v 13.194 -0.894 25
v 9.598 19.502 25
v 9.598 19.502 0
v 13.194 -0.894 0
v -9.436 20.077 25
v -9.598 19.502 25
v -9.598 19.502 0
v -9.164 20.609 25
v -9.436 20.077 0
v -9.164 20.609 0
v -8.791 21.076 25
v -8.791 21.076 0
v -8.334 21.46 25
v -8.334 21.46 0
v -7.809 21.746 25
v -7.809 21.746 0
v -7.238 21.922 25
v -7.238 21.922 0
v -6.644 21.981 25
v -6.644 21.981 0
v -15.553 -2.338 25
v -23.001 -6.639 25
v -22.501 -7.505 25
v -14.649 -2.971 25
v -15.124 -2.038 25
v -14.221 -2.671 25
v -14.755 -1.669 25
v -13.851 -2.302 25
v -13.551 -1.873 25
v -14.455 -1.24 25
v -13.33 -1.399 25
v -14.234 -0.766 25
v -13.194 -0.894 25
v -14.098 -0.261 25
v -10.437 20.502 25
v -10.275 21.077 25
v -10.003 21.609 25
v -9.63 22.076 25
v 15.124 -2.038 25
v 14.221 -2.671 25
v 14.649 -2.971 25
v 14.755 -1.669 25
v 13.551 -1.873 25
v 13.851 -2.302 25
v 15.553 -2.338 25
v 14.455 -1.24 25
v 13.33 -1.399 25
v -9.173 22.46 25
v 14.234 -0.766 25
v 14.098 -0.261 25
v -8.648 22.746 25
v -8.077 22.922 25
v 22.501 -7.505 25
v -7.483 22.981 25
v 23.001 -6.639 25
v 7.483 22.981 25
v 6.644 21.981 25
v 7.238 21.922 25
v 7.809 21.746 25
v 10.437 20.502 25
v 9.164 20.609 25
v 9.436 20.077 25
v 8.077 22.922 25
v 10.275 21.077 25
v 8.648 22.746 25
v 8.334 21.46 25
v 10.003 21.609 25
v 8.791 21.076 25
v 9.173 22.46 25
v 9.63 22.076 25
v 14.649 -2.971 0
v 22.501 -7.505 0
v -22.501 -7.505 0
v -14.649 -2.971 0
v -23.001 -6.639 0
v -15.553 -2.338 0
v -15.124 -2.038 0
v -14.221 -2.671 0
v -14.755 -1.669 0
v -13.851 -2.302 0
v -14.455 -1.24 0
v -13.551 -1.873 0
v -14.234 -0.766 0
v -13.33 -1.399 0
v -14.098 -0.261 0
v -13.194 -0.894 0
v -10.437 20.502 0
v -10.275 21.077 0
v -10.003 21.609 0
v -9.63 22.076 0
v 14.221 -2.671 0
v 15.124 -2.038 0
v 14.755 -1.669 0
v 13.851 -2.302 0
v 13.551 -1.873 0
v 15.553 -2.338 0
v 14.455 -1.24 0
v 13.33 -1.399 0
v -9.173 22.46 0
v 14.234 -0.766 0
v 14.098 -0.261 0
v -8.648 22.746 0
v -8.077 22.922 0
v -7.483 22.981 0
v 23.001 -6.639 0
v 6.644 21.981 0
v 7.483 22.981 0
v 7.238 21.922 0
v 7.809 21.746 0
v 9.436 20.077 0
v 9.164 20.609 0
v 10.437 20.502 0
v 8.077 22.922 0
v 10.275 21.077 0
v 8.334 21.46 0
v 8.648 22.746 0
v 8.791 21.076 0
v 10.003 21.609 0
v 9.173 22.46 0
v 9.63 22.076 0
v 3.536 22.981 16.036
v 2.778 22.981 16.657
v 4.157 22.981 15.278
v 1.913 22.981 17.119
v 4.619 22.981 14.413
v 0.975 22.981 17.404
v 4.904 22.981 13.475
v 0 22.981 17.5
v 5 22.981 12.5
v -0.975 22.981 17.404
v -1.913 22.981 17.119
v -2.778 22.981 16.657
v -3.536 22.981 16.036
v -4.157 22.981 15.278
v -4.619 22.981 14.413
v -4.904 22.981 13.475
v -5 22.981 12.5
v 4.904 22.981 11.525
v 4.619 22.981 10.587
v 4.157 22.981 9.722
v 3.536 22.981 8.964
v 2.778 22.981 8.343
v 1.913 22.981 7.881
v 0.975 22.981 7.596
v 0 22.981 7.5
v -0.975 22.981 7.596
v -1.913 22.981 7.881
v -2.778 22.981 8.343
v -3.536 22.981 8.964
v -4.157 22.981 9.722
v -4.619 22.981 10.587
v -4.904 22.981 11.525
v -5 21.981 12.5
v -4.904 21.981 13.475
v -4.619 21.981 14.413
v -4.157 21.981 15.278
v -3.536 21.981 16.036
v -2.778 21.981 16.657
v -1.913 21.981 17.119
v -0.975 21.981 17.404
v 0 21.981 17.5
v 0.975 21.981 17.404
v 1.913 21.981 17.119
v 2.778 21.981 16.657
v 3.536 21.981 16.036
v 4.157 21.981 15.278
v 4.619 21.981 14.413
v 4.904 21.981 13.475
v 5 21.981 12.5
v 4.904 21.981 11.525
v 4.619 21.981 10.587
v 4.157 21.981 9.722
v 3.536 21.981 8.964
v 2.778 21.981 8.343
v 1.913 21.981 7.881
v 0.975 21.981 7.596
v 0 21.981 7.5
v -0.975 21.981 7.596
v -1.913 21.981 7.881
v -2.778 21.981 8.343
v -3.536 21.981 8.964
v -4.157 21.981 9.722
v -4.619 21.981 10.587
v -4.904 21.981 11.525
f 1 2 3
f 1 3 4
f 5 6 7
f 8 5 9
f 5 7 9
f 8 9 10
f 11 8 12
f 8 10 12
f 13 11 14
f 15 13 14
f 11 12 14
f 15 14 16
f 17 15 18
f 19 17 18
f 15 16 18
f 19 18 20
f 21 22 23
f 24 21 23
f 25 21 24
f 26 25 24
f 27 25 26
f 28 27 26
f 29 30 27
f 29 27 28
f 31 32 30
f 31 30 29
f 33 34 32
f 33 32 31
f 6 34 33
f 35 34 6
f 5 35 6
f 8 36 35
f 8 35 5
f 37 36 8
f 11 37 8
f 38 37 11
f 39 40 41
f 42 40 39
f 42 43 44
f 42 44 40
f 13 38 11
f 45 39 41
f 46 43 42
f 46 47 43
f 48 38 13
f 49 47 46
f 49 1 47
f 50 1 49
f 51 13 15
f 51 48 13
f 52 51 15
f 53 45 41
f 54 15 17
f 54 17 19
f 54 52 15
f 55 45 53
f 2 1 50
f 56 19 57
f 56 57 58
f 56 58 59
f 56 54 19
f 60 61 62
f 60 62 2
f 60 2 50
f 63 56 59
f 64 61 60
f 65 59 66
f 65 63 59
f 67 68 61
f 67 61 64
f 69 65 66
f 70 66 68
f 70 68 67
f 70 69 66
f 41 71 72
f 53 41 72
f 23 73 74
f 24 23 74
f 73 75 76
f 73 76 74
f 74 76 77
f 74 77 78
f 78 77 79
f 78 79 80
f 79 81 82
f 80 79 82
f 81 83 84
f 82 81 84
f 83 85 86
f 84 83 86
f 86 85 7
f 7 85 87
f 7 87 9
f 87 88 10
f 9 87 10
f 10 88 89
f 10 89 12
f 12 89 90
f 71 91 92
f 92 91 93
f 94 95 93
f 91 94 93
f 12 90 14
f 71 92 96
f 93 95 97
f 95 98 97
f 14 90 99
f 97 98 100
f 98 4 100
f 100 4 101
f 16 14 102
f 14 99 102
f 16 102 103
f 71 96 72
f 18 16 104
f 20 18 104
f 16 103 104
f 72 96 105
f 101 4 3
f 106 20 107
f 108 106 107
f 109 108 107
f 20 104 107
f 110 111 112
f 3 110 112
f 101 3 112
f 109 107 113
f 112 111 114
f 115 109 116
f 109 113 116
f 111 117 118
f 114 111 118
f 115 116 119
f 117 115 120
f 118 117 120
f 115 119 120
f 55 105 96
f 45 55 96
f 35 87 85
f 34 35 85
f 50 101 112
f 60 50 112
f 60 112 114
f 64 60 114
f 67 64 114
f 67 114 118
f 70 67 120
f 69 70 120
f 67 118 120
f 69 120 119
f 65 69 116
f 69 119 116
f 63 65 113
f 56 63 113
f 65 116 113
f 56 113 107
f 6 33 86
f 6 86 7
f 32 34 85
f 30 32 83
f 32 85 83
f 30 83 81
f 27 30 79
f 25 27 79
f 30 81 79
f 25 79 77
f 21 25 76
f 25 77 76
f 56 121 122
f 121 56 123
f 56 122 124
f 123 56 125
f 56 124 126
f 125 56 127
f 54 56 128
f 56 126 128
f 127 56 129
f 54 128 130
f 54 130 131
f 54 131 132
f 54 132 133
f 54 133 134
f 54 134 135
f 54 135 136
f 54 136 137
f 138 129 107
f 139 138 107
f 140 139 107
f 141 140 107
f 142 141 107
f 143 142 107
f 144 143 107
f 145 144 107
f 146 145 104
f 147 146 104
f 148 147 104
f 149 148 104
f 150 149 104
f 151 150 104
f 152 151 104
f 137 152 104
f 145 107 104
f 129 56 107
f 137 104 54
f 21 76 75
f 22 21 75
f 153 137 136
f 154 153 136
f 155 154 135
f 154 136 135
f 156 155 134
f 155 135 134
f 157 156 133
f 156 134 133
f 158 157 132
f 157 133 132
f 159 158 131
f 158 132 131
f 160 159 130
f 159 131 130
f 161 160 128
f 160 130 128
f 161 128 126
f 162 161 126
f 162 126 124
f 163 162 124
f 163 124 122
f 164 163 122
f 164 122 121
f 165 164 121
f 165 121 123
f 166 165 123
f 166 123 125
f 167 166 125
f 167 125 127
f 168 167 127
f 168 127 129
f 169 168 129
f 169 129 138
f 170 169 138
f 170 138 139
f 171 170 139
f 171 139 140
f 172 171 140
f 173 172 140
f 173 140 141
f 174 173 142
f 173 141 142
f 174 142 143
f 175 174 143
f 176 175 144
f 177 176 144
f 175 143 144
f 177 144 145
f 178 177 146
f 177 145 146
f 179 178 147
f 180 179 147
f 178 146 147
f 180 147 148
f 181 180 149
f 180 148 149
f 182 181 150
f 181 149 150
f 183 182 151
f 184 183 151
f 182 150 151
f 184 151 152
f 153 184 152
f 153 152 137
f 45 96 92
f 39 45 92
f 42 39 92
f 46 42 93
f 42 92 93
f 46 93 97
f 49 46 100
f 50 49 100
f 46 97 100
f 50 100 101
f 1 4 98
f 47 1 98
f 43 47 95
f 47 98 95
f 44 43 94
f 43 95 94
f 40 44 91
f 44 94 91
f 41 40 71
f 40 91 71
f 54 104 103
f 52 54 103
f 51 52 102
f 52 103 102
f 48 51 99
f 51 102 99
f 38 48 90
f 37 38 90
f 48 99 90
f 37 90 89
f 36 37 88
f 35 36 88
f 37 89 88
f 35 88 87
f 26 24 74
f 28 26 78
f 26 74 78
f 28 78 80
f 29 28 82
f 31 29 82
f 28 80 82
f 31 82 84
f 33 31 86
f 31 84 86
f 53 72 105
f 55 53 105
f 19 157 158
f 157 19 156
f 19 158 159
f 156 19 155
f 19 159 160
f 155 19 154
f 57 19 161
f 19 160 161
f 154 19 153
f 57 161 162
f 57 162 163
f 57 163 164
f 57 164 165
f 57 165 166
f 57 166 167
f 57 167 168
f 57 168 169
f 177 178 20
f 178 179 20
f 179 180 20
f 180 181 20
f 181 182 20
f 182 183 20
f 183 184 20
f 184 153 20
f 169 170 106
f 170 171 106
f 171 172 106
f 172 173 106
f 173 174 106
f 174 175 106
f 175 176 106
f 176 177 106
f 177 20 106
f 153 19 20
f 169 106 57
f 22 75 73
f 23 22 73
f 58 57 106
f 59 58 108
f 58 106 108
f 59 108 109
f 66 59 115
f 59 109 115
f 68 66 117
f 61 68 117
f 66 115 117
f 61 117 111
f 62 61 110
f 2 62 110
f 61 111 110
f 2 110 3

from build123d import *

# Parameters (mm, degrees)
F1_DEPTH = 25
F2_R     = 5
F3_DEPTH = 25


with BuildPart() as f1:
    # F0 (on Top) → F1 (new body)
    with BuildSketch(Plane.XY):
        with BuildLine():
            Line((7.482701, 22.981227), (0, 22.981227))
            Line((0, 22.981227), (-7.482701, 22.981227))
            ThreePointArc((-7.482701, 22.981227), (-9.411064, 22.27936), (-10.437124, 20.502171))
            Line((-10.437124, 20.502171), (-14.098284, -0.261297))
            ThreePointArc((-14.098284, -0.261297), (-14.595251, -1.461082), (-15.552707, -2.338429))
            Line((-15.552707, -2.338429), (-23.001458, -6.638967))
            Line((-23.001458, -6.638967), (-22.501458, -7.504993))
            Line((-22.501458, -7.504993), (-14.648873, -2.9713))
            ThreePointArc((-14.648873, -2.9713), (-13.691417, -2.093953), (-13.19445, -0.894169))
            Line((-13.19445, -0.894169), (-9.598025, 19.502171))
            ThreePointArc((-9.598025, 19.502171), (-8.571964, 21.27936), (-6.643601, 21.981227))
            Line((-6.643601, 21.981227), (0, 21.981227))
            Line((0, 21.981227), (6.643601, 21.981227))
            ThreePointArc((6.643601, 21.981227), (8.571964, 21.27936), (9.598025, 19.502171))
            Line((9.598025, 19.502171), (13.19445, -0.894169))
            ThreePointArc((13.19445, -0.894169), (13.691417, -2.093953), (14.648873, -2.9713))
            Line((14.648873, -2.9713), (22.501458, -7.504993))
            Line((22.501458, -7.504993), (23.001458, -6.638967))
            Line((23.001458, -6.638967), (15.552707, -2.338429))
            ThreePointArc((15.552707, -2.338429), (14.595251, -1.461082), (14.098284, -0.261297))
            Line((14.098284, -0.261297), (10.437124, 20.502171))
            ThreePointArc((10.437124, 20.502171), (9.411064, 22.27936), (7.482701, 22.981227))
        make_face()
    extrude(amount=F1_DEPTH)

    # F2 (on face) → F3 (cut)
    with BuildSketch(Plane(origin=(0, 22.981227, 0), x_dir=(-1, 0, 0), z_dir=(0, 1, 0))):
        with Locations((0, 12.5)):
            Circle(F2_R)
    extrude(amount=-F3_DEPTH, mode=Mode.SUBTRACT)


solid = f1.part
